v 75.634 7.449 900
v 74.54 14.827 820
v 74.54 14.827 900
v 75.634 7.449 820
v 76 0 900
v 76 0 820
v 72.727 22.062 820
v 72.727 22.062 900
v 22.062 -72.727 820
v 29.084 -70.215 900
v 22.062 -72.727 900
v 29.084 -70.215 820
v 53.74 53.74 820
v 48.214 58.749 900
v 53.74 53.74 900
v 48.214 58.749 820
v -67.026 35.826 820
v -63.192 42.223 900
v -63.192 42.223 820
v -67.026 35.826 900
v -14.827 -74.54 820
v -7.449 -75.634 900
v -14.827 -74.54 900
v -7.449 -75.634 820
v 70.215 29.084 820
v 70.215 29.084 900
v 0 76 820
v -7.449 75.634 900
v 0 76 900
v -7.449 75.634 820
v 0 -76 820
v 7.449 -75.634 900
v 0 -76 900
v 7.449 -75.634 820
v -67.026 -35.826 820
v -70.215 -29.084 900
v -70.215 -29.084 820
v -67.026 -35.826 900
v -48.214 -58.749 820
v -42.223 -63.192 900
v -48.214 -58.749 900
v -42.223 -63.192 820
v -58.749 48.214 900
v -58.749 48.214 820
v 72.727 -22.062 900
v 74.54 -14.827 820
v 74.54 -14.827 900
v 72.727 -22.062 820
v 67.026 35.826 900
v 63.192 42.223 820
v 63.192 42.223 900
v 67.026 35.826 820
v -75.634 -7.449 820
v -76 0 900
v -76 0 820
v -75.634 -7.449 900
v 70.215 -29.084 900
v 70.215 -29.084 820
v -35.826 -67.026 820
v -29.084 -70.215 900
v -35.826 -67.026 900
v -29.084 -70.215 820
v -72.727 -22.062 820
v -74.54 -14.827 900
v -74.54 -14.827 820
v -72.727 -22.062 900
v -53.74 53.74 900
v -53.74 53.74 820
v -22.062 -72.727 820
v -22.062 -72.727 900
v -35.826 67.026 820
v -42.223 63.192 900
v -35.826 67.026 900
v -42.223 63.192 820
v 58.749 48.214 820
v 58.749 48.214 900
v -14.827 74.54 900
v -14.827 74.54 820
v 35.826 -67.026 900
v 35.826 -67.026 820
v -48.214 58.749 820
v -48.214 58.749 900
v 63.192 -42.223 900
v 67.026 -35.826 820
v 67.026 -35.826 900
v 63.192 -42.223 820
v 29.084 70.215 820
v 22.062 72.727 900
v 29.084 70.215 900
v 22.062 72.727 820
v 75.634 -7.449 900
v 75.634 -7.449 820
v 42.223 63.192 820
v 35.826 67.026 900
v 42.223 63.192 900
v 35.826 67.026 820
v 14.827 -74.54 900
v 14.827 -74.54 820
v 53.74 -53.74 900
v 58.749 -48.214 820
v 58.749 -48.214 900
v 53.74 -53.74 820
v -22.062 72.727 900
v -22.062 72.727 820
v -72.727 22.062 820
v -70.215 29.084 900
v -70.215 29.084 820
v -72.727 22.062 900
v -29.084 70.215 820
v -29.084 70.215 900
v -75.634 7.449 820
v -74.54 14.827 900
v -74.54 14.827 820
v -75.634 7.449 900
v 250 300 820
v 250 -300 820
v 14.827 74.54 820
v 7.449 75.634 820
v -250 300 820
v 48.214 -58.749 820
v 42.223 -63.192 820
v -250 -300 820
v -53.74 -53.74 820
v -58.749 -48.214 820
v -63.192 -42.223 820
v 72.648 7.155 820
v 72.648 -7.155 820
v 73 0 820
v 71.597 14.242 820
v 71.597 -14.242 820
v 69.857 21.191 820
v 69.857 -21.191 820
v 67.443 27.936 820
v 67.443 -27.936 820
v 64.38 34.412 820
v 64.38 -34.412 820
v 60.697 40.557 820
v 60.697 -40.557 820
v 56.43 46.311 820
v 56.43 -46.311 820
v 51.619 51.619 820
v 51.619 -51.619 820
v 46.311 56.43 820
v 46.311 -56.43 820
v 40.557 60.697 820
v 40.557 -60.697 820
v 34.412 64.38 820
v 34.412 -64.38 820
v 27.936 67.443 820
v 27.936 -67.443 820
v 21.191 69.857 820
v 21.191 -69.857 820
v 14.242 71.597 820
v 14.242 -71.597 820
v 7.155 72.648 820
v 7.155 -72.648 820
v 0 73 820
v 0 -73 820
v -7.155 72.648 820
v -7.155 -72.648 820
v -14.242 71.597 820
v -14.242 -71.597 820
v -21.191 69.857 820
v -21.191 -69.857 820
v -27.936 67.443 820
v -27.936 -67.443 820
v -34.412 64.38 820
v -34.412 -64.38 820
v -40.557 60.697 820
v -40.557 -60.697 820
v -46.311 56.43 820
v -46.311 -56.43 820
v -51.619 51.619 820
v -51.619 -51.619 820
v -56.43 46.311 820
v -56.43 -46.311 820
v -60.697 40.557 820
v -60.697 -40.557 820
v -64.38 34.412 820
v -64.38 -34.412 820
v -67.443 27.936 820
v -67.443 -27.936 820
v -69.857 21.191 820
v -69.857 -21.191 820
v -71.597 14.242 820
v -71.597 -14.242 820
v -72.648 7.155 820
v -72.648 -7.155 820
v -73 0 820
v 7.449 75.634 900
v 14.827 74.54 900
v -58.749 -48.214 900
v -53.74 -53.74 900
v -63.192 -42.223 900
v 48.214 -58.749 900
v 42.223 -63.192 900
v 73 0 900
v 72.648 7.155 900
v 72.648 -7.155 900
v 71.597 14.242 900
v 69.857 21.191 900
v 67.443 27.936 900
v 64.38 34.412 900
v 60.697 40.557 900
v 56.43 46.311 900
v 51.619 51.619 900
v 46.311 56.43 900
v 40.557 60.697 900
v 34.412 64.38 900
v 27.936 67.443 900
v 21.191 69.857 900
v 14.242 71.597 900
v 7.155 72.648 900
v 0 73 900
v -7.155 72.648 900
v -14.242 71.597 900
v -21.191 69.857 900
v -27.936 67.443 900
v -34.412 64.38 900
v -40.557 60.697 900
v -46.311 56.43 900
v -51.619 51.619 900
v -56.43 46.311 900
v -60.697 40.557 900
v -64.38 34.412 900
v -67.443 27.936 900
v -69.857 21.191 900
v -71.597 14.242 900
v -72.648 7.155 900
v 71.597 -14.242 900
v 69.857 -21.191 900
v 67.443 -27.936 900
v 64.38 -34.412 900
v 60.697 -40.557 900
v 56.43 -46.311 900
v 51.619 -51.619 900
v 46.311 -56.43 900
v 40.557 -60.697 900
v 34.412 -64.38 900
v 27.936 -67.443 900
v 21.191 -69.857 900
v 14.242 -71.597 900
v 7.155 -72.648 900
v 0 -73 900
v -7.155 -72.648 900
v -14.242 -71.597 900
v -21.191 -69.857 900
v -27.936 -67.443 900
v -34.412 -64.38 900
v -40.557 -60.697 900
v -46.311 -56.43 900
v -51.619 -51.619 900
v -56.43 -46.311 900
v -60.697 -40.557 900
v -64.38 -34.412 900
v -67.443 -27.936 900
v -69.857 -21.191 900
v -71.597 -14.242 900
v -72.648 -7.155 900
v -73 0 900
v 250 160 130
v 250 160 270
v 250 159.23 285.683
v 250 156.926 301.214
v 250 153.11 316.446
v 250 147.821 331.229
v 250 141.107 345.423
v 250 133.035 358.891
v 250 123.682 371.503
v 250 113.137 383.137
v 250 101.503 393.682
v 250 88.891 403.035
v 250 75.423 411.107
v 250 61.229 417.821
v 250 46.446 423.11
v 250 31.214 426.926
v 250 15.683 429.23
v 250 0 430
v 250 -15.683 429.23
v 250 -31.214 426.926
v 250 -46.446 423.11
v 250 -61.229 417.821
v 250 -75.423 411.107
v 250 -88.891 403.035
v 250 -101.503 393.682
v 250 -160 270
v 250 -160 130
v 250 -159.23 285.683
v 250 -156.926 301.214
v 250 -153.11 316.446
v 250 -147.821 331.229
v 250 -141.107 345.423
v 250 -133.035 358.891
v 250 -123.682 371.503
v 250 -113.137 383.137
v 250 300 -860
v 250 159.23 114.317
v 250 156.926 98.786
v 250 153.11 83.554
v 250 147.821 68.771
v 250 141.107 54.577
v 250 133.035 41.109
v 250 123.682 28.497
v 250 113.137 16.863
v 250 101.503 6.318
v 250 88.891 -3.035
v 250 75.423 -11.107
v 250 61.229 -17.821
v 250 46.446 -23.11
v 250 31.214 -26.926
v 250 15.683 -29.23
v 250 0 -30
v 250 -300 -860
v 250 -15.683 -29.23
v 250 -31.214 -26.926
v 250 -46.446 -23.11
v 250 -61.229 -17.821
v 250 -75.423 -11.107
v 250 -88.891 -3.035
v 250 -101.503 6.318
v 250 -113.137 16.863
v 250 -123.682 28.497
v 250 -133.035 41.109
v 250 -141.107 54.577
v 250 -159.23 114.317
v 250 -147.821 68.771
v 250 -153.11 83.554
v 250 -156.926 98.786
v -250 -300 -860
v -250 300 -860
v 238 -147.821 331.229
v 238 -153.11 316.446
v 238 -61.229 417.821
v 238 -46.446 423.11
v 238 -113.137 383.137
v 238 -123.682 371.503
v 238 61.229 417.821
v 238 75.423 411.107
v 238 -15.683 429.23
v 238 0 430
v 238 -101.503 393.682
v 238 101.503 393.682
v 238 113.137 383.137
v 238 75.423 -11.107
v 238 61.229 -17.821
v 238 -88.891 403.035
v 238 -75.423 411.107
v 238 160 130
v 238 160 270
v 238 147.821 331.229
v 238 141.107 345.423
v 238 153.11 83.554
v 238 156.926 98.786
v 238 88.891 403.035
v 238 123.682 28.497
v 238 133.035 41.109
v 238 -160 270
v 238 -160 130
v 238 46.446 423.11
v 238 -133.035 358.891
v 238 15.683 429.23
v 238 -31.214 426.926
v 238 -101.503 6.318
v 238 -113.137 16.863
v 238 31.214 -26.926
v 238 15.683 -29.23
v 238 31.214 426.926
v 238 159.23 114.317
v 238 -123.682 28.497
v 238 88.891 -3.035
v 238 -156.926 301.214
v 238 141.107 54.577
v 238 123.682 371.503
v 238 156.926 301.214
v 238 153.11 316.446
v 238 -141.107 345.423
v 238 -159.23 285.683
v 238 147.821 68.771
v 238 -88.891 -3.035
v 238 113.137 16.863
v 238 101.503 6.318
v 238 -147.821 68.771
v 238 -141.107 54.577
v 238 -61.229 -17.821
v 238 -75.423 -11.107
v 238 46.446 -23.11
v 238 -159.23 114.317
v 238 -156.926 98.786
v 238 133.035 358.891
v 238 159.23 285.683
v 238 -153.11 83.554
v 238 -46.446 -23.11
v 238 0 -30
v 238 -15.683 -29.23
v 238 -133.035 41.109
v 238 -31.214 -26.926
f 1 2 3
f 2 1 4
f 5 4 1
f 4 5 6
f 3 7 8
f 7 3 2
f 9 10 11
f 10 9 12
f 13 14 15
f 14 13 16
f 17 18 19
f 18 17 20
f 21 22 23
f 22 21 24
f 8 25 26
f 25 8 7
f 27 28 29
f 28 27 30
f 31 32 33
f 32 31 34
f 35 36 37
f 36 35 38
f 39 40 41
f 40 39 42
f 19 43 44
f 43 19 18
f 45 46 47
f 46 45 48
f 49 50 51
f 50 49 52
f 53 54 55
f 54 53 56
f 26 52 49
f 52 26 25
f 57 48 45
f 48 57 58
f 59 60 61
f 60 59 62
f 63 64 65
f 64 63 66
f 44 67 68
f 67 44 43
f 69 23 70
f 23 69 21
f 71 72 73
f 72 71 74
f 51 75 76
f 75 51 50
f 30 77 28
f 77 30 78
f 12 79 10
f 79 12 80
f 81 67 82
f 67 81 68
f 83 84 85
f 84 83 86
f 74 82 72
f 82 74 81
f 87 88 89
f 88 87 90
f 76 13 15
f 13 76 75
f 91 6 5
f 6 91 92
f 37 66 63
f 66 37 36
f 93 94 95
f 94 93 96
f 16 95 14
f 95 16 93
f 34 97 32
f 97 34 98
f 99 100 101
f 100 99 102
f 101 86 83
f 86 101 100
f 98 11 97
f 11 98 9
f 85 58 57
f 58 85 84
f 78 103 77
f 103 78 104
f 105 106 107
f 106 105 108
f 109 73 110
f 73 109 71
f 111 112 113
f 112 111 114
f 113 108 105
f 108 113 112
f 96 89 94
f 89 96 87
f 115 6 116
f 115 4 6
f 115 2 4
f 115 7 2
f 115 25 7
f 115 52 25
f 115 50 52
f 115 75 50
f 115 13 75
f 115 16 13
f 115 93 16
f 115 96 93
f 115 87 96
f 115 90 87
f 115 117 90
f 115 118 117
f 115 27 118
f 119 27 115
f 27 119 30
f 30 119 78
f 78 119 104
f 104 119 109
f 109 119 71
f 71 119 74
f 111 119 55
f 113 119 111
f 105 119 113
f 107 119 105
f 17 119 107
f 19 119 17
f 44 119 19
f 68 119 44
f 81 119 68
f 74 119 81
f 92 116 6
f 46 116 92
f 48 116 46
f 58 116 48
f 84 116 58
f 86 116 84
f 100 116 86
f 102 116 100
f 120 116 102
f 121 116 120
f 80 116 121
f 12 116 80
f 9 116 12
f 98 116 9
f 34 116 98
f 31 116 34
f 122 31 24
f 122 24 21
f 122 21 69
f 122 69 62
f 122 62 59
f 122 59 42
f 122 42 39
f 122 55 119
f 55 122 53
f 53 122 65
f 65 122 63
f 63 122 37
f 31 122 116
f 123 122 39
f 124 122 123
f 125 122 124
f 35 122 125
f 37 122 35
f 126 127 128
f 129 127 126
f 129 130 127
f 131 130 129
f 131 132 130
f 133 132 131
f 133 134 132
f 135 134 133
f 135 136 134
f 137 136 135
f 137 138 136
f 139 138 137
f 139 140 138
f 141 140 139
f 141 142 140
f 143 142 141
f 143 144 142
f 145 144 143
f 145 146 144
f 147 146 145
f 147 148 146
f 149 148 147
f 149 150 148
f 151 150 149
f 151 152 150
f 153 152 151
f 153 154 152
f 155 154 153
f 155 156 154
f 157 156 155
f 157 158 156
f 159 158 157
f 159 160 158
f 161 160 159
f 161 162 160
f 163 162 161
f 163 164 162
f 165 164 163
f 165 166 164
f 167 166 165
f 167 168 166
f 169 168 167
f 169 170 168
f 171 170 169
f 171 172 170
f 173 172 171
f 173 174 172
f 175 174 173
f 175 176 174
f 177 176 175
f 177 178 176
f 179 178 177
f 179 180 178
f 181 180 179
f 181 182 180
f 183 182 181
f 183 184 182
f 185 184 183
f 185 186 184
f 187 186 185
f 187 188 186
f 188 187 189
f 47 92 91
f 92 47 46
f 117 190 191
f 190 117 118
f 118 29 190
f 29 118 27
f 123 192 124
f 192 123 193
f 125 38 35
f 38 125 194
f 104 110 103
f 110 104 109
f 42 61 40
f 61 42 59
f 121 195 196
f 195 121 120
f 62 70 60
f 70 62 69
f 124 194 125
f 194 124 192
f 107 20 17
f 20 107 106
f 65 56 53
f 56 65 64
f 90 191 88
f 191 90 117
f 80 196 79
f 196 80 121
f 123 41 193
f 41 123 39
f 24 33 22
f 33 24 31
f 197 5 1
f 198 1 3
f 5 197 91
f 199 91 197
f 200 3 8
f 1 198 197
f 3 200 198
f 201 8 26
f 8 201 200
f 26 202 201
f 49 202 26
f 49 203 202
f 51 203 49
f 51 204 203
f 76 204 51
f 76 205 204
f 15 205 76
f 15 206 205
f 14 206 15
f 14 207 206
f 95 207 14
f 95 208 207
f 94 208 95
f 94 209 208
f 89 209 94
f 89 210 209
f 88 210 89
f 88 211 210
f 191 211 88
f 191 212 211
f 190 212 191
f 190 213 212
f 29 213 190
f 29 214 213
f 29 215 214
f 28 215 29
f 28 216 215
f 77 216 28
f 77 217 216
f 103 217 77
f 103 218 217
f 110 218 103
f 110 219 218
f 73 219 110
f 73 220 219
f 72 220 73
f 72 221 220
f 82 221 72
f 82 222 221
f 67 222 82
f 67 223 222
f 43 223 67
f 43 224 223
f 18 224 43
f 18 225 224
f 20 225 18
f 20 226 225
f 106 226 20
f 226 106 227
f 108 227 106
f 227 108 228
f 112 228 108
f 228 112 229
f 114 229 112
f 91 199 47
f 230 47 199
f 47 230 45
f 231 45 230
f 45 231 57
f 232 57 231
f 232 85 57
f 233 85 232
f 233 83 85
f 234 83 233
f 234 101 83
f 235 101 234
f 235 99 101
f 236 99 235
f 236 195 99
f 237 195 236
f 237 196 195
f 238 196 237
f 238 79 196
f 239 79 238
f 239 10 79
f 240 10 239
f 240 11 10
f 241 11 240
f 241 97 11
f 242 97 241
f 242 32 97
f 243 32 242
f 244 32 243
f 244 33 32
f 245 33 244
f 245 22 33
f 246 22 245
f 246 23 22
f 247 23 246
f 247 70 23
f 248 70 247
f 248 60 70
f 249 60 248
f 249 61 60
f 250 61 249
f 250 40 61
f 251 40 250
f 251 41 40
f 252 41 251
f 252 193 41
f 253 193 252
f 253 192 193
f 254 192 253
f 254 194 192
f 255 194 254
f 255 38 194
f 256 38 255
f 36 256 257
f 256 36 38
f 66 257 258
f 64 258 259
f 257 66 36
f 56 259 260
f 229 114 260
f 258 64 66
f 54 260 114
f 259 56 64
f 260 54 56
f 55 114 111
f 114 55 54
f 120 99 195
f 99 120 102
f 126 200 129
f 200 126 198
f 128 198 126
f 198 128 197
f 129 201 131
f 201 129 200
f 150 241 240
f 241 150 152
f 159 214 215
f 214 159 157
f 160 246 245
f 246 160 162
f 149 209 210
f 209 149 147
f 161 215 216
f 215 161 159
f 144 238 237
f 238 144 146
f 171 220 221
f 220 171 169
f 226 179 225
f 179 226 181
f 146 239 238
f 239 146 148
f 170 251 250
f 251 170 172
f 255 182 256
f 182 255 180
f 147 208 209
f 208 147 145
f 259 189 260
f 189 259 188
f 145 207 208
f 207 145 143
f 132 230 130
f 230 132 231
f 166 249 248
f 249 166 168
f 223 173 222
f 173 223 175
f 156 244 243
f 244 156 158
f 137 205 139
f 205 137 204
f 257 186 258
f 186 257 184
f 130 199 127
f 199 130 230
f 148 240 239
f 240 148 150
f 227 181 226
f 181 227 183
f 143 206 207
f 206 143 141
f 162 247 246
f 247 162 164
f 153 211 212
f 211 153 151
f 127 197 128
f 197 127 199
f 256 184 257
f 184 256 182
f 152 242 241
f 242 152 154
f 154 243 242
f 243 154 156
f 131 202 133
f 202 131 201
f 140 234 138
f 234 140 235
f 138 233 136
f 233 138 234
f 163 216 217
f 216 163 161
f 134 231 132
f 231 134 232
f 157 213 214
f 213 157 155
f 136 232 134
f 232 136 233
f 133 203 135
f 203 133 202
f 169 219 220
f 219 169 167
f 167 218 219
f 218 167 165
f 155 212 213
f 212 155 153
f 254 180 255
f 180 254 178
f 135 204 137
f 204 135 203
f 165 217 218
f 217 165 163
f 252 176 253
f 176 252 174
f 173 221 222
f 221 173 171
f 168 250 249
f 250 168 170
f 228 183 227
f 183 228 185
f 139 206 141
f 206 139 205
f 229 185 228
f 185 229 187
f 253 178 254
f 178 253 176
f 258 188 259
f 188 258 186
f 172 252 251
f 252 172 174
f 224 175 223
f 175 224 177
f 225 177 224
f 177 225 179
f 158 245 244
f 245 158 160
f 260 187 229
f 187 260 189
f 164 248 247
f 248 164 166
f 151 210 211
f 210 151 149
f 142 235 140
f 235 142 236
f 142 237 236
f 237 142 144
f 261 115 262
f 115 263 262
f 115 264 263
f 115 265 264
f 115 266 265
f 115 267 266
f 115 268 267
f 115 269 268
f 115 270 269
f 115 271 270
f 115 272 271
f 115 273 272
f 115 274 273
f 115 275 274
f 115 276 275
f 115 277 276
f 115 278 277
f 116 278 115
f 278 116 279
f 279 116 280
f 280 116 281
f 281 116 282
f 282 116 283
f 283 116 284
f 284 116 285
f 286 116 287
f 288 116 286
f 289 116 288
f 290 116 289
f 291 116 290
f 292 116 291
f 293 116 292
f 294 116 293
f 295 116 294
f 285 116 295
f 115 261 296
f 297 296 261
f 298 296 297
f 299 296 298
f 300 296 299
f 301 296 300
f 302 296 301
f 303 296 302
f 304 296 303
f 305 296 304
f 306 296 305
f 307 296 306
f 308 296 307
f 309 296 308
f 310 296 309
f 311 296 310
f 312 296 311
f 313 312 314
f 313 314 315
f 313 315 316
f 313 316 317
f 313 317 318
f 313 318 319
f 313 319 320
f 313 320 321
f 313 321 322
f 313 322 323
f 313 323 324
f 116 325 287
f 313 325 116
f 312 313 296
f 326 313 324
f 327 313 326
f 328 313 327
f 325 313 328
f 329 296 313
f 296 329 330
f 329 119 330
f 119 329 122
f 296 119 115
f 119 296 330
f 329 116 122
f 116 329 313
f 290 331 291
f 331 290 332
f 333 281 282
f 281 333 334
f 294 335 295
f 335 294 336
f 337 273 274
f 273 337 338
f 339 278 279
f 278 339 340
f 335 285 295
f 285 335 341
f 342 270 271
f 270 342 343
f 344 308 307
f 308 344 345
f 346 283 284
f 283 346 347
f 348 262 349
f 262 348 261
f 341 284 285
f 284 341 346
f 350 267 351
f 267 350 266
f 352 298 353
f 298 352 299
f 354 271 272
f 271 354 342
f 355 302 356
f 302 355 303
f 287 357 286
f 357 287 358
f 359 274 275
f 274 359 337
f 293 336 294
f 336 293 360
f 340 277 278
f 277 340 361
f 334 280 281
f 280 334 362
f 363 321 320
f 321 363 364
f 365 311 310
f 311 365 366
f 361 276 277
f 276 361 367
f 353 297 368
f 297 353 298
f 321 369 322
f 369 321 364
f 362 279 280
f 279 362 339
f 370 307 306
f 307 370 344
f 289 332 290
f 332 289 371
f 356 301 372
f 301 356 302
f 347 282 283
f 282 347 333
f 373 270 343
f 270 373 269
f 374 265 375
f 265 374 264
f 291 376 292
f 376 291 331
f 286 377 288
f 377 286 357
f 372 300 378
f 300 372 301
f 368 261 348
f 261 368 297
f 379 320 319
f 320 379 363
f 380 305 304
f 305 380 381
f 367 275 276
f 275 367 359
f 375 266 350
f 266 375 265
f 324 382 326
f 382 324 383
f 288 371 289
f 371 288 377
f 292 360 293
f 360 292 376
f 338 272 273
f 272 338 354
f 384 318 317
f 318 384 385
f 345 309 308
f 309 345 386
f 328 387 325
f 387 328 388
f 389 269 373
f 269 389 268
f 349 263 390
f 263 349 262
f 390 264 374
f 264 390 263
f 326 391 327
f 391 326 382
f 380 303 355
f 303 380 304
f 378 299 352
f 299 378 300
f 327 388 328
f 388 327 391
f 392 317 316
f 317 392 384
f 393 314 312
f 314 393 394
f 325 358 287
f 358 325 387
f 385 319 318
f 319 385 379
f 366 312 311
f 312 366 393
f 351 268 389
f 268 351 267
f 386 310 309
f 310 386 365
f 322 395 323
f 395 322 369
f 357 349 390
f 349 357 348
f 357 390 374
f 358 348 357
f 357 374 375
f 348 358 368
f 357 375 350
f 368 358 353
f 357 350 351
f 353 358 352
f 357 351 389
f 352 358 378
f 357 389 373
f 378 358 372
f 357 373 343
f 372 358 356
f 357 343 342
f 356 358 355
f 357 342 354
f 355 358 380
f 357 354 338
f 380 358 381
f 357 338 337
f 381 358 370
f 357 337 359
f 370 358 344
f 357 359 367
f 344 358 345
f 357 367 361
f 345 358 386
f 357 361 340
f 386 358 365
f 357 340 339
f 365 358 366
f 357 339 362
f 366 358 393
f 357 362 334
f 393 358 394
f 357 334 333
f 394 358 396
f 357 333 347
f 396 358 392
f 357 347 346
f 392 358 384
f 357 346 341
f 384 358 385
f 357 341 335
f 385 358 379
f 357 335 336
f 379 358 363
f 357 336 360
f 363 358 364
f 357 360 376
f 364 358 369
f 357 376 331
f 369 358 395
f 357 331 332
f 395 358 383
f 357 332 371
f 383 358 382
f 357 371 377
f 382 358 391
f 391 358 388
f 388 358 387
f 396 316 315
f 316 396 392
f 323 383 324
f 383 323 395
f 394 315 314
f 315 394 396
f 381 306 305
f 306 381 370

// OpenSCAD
// ============================================================================
// Atom Lithography Machine — Parametric OpenSCAD Module (S1.6-01)
// ============================================================================
// part_id           : S1.6-01
// parent_bom_id     : S1.6
// subsystem         : S1
// part_name         : Cift-tuplu egzozlu PH3/SiF4 toksik gaz kabini (SEMI S2, Exp81/83)
// material          : Steel
// temp_stage        : 300 K (tesis)
// vacuum_grade      : Atmosfer (negatif basinc)
// tolerance         : He <=1e-9 mbar*L/s
// computed_mass_kg  : 139.16831
// envelope_mm       : 500.000 x 600.000 x 1799.750
// design_maturity   : M0_M1_DETAILED_CAD_DESIGN_ONLY
// no_lab_measurement: true
// iec61508_certified: false
// semi_s2_certified : false
// Units: millimeters (mm)
// ============================================================================

$fn = 64;

// Nominal bounding envelope parameters (mm)
bbox_x = 500.0000;
bbox_y = 600.0000;
bbox_z = 1799.7500;

// Part-specific parametric dimensions
cab_dx = 500.0;
cab_dy = 600.0;
cab_h = 1800.0;
semi_s2_ref = "UNVERIFIED_M0_DESIGN";

// Interface / port parameters (mm)
port_exhaust_duct_top_od = 152.000;
port_exhaust_duct_top_bore = 146.000;
port_ph3_coax_outlet_od = 12.700;
port_ph3_coax_outlet_bore = 6.400;

module part_S1_6_01() {
  difference() {
    union() {
      // SEMI S2 dual-cylinder steel cabinet shell
      translate([0.000, 0.000, -20.000]) cube([500.000, 600.000, 1680.000], center=true);
      // Top Ø150 mm negative-pressure exhaust collar
      translate([0.000, 0.000, 860.000]) {
        difference() {
          cylinder(d=152.000, h=80.000, center=true);
          cylinder(d=146.000, h=82.000, center=true);
        }
      }
    }
    // Self-closing door sight-glass cutout
    translate([248.000, 0.000, 200.000]) rotate([0.000, 90.000, 0.000]) {
      hull() {
        translate([-70.000, 0, 0]) cylinder(d=320.000, h=20.000, center=true);
        translate([70.000, 0, 0]) cylinder(d=320.000, h=20.000, center=true);
      }
    }
  }
}

// World assembly mounting transform (global machine frame, mm / deg):
// translate([-1350.000, 1050.000, 400.000]) rotate([0.000, 0.000, 0.000]) part_S1_6_01();

part_S1_6_01();
